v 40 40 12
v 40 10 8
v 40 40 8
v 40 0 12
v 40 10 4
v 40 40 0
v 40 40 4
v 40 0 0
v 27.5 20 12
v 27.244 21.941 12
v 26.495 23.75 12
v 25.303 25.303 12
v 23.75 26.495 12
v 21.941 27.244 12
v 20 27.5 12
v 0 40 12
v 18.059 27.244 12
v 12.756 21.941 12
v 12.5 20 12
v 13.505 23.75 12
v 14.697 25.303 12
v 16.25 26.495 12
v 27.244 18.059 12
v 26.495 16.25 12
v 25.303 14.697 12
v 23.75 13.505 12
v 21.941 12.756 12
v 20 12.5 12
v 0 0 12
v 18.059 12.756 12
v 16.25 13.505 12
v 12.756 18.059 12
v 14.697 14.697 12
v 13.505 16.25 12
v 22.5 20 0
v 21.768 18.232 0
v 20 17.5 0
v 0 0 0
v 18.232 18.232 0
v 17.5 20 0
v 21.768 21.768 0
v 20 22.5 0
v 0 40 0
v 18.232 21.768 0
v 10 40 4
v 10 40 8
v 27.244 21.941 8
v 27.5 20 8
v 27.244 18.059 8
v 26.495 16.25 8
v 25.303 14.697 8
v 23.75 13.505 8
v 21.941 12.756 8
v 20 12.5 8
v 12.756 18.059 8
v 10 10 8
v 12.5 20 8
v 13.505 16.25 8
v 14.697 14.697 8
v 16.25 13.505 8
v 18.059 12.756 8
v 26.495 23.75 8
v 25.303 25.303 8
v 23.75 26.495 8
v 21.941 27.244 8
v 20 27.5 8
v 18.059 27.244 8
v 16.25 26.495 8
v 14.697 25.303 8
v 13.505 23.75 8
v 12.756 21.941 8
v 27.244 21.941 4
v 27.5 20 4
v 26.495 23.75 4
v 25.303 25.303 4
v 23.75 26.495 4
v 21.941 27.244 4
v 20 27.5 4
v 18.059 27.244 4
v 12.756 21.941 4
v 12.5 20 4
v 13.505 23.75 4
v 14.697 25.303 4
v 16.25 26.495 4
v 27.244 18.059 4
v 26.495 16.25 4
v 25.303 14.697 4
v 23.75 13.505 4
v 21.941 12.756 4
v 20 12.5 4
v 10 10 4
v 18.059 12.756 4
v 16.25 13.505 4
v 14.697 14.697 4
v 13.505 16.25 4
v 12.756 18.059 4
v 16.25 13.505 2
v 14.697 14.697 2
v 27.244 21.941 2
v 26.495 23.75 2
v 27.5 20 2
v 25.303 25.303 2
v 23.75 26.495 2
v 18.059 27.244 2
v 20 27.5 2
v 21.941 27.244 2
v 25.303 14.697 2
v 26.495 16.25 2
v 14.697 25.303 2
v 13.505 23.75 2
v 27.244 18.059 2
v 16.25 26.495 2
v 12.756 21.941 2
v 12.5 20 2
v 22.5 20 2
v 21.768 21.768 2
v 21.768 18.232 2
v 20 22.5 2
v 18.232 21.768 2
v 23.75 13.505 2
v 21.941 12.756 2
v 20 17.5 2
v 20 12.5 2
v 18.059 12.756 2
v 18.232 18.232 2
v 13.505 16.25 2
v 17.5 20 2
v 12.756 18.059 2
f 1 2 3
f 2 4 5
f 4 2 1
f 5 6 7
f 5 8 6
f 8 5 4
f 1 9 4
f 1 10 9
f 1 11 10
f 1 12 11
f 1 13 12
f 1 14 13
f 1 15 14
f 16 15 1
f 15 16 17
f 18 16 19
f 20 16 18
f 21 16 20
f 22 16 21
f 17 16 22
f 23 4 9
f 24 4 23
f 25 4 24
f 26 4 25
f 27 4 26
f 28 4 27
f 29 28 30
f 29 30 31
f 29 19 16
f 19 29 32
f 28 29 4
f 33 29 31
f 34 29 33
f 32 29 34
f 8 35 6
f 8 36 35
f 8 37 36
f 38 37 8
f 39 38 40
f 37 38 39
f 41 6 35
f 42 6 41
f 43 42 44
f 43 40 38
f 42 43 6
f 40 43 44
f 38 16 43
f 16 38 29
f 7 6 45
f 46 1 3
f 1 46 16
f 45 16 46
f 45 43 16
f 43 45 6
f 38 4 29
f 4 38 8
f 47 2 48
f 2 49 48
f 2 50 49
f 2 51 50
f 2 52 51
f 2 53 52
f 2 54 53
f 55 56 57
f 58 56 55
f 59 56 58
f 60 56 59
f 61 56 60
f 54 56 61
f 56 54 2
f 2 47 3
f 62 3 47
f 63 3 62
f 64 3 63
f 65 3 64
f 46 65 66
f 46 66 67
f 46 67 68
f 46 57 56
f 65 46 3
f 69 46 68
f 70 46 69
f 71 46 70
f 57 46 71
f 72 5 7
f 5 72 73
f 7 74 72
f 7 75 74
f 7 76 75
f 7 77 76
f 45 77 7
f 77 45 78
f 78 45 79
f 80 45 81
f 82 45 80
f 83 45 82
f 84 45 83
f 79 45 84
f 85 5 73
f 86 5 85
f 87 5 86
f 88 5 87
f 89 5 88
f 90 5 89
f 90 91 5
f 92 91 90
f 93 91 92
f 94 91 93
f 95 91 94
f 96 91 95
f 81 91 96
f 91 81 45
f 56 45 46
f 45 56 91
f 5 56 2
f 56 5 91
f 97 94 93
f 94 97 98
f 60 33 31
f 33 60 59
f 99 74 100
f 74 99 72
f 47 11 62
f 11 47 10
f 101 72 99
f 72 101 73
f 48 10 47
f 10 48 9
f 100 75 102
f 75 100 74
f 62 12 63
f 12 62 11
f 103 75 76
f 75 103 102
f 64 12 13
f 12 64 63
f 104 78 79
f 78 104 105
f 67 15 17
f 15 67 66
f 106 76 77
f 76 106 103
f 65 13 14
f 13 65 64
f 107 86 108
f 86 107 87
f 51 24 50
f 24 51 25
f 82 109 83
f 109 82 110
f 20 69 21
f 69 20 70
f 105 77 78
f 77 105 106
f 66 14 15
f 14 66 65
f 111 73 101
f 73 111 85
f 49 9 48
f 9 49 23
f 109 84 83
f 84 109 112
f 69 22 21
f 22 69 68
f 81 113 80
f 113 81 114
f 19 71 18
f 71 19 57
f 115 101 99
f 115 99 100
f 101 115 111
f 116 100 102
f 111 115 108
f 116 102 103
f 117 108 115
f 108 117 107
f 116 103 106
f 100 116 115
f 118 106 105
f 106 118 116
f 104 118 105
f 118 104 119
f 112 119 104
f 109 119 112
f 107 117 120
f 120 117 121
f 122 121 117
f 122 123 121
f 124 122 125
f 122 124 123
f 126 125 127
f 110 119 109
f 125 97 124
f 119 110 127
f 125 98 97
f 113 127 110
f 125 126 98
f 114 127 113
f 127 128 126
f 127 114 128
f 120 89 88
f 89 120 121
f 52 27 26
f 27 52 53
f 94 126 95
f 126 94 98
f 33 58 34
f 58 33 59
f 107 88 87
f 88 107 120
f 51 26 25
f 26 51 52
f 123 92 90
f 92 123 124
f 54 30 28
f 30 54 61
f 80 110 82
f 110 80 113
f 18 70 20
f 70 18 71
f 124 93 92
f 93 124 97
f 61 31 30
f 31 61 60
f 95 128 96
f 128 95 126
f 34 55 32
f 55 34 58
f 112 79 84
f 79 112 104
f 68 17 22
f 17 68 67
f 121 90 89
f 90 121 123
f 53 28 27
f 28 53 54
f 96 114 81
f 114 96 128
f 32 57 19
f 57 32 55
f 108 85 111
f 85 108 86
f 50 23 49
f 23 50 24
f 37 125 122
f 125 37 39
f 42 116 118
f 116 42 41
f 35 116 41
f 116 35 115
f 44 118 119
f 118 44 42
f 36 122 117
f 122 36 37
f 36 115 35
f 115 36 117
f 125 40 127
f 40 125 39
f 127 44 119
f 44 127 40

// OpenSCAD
difference()
{
  cube([40,40,12]);
  translate([10,10,4]) cube([40,40,4]);
  translate([20,20,2]) rotate([0,0,0]) cylinder(h=16,d=15);
  translate([20,20,-2]) rotate([0,0,0]) cylinder(h=16,d=5);
  
}
